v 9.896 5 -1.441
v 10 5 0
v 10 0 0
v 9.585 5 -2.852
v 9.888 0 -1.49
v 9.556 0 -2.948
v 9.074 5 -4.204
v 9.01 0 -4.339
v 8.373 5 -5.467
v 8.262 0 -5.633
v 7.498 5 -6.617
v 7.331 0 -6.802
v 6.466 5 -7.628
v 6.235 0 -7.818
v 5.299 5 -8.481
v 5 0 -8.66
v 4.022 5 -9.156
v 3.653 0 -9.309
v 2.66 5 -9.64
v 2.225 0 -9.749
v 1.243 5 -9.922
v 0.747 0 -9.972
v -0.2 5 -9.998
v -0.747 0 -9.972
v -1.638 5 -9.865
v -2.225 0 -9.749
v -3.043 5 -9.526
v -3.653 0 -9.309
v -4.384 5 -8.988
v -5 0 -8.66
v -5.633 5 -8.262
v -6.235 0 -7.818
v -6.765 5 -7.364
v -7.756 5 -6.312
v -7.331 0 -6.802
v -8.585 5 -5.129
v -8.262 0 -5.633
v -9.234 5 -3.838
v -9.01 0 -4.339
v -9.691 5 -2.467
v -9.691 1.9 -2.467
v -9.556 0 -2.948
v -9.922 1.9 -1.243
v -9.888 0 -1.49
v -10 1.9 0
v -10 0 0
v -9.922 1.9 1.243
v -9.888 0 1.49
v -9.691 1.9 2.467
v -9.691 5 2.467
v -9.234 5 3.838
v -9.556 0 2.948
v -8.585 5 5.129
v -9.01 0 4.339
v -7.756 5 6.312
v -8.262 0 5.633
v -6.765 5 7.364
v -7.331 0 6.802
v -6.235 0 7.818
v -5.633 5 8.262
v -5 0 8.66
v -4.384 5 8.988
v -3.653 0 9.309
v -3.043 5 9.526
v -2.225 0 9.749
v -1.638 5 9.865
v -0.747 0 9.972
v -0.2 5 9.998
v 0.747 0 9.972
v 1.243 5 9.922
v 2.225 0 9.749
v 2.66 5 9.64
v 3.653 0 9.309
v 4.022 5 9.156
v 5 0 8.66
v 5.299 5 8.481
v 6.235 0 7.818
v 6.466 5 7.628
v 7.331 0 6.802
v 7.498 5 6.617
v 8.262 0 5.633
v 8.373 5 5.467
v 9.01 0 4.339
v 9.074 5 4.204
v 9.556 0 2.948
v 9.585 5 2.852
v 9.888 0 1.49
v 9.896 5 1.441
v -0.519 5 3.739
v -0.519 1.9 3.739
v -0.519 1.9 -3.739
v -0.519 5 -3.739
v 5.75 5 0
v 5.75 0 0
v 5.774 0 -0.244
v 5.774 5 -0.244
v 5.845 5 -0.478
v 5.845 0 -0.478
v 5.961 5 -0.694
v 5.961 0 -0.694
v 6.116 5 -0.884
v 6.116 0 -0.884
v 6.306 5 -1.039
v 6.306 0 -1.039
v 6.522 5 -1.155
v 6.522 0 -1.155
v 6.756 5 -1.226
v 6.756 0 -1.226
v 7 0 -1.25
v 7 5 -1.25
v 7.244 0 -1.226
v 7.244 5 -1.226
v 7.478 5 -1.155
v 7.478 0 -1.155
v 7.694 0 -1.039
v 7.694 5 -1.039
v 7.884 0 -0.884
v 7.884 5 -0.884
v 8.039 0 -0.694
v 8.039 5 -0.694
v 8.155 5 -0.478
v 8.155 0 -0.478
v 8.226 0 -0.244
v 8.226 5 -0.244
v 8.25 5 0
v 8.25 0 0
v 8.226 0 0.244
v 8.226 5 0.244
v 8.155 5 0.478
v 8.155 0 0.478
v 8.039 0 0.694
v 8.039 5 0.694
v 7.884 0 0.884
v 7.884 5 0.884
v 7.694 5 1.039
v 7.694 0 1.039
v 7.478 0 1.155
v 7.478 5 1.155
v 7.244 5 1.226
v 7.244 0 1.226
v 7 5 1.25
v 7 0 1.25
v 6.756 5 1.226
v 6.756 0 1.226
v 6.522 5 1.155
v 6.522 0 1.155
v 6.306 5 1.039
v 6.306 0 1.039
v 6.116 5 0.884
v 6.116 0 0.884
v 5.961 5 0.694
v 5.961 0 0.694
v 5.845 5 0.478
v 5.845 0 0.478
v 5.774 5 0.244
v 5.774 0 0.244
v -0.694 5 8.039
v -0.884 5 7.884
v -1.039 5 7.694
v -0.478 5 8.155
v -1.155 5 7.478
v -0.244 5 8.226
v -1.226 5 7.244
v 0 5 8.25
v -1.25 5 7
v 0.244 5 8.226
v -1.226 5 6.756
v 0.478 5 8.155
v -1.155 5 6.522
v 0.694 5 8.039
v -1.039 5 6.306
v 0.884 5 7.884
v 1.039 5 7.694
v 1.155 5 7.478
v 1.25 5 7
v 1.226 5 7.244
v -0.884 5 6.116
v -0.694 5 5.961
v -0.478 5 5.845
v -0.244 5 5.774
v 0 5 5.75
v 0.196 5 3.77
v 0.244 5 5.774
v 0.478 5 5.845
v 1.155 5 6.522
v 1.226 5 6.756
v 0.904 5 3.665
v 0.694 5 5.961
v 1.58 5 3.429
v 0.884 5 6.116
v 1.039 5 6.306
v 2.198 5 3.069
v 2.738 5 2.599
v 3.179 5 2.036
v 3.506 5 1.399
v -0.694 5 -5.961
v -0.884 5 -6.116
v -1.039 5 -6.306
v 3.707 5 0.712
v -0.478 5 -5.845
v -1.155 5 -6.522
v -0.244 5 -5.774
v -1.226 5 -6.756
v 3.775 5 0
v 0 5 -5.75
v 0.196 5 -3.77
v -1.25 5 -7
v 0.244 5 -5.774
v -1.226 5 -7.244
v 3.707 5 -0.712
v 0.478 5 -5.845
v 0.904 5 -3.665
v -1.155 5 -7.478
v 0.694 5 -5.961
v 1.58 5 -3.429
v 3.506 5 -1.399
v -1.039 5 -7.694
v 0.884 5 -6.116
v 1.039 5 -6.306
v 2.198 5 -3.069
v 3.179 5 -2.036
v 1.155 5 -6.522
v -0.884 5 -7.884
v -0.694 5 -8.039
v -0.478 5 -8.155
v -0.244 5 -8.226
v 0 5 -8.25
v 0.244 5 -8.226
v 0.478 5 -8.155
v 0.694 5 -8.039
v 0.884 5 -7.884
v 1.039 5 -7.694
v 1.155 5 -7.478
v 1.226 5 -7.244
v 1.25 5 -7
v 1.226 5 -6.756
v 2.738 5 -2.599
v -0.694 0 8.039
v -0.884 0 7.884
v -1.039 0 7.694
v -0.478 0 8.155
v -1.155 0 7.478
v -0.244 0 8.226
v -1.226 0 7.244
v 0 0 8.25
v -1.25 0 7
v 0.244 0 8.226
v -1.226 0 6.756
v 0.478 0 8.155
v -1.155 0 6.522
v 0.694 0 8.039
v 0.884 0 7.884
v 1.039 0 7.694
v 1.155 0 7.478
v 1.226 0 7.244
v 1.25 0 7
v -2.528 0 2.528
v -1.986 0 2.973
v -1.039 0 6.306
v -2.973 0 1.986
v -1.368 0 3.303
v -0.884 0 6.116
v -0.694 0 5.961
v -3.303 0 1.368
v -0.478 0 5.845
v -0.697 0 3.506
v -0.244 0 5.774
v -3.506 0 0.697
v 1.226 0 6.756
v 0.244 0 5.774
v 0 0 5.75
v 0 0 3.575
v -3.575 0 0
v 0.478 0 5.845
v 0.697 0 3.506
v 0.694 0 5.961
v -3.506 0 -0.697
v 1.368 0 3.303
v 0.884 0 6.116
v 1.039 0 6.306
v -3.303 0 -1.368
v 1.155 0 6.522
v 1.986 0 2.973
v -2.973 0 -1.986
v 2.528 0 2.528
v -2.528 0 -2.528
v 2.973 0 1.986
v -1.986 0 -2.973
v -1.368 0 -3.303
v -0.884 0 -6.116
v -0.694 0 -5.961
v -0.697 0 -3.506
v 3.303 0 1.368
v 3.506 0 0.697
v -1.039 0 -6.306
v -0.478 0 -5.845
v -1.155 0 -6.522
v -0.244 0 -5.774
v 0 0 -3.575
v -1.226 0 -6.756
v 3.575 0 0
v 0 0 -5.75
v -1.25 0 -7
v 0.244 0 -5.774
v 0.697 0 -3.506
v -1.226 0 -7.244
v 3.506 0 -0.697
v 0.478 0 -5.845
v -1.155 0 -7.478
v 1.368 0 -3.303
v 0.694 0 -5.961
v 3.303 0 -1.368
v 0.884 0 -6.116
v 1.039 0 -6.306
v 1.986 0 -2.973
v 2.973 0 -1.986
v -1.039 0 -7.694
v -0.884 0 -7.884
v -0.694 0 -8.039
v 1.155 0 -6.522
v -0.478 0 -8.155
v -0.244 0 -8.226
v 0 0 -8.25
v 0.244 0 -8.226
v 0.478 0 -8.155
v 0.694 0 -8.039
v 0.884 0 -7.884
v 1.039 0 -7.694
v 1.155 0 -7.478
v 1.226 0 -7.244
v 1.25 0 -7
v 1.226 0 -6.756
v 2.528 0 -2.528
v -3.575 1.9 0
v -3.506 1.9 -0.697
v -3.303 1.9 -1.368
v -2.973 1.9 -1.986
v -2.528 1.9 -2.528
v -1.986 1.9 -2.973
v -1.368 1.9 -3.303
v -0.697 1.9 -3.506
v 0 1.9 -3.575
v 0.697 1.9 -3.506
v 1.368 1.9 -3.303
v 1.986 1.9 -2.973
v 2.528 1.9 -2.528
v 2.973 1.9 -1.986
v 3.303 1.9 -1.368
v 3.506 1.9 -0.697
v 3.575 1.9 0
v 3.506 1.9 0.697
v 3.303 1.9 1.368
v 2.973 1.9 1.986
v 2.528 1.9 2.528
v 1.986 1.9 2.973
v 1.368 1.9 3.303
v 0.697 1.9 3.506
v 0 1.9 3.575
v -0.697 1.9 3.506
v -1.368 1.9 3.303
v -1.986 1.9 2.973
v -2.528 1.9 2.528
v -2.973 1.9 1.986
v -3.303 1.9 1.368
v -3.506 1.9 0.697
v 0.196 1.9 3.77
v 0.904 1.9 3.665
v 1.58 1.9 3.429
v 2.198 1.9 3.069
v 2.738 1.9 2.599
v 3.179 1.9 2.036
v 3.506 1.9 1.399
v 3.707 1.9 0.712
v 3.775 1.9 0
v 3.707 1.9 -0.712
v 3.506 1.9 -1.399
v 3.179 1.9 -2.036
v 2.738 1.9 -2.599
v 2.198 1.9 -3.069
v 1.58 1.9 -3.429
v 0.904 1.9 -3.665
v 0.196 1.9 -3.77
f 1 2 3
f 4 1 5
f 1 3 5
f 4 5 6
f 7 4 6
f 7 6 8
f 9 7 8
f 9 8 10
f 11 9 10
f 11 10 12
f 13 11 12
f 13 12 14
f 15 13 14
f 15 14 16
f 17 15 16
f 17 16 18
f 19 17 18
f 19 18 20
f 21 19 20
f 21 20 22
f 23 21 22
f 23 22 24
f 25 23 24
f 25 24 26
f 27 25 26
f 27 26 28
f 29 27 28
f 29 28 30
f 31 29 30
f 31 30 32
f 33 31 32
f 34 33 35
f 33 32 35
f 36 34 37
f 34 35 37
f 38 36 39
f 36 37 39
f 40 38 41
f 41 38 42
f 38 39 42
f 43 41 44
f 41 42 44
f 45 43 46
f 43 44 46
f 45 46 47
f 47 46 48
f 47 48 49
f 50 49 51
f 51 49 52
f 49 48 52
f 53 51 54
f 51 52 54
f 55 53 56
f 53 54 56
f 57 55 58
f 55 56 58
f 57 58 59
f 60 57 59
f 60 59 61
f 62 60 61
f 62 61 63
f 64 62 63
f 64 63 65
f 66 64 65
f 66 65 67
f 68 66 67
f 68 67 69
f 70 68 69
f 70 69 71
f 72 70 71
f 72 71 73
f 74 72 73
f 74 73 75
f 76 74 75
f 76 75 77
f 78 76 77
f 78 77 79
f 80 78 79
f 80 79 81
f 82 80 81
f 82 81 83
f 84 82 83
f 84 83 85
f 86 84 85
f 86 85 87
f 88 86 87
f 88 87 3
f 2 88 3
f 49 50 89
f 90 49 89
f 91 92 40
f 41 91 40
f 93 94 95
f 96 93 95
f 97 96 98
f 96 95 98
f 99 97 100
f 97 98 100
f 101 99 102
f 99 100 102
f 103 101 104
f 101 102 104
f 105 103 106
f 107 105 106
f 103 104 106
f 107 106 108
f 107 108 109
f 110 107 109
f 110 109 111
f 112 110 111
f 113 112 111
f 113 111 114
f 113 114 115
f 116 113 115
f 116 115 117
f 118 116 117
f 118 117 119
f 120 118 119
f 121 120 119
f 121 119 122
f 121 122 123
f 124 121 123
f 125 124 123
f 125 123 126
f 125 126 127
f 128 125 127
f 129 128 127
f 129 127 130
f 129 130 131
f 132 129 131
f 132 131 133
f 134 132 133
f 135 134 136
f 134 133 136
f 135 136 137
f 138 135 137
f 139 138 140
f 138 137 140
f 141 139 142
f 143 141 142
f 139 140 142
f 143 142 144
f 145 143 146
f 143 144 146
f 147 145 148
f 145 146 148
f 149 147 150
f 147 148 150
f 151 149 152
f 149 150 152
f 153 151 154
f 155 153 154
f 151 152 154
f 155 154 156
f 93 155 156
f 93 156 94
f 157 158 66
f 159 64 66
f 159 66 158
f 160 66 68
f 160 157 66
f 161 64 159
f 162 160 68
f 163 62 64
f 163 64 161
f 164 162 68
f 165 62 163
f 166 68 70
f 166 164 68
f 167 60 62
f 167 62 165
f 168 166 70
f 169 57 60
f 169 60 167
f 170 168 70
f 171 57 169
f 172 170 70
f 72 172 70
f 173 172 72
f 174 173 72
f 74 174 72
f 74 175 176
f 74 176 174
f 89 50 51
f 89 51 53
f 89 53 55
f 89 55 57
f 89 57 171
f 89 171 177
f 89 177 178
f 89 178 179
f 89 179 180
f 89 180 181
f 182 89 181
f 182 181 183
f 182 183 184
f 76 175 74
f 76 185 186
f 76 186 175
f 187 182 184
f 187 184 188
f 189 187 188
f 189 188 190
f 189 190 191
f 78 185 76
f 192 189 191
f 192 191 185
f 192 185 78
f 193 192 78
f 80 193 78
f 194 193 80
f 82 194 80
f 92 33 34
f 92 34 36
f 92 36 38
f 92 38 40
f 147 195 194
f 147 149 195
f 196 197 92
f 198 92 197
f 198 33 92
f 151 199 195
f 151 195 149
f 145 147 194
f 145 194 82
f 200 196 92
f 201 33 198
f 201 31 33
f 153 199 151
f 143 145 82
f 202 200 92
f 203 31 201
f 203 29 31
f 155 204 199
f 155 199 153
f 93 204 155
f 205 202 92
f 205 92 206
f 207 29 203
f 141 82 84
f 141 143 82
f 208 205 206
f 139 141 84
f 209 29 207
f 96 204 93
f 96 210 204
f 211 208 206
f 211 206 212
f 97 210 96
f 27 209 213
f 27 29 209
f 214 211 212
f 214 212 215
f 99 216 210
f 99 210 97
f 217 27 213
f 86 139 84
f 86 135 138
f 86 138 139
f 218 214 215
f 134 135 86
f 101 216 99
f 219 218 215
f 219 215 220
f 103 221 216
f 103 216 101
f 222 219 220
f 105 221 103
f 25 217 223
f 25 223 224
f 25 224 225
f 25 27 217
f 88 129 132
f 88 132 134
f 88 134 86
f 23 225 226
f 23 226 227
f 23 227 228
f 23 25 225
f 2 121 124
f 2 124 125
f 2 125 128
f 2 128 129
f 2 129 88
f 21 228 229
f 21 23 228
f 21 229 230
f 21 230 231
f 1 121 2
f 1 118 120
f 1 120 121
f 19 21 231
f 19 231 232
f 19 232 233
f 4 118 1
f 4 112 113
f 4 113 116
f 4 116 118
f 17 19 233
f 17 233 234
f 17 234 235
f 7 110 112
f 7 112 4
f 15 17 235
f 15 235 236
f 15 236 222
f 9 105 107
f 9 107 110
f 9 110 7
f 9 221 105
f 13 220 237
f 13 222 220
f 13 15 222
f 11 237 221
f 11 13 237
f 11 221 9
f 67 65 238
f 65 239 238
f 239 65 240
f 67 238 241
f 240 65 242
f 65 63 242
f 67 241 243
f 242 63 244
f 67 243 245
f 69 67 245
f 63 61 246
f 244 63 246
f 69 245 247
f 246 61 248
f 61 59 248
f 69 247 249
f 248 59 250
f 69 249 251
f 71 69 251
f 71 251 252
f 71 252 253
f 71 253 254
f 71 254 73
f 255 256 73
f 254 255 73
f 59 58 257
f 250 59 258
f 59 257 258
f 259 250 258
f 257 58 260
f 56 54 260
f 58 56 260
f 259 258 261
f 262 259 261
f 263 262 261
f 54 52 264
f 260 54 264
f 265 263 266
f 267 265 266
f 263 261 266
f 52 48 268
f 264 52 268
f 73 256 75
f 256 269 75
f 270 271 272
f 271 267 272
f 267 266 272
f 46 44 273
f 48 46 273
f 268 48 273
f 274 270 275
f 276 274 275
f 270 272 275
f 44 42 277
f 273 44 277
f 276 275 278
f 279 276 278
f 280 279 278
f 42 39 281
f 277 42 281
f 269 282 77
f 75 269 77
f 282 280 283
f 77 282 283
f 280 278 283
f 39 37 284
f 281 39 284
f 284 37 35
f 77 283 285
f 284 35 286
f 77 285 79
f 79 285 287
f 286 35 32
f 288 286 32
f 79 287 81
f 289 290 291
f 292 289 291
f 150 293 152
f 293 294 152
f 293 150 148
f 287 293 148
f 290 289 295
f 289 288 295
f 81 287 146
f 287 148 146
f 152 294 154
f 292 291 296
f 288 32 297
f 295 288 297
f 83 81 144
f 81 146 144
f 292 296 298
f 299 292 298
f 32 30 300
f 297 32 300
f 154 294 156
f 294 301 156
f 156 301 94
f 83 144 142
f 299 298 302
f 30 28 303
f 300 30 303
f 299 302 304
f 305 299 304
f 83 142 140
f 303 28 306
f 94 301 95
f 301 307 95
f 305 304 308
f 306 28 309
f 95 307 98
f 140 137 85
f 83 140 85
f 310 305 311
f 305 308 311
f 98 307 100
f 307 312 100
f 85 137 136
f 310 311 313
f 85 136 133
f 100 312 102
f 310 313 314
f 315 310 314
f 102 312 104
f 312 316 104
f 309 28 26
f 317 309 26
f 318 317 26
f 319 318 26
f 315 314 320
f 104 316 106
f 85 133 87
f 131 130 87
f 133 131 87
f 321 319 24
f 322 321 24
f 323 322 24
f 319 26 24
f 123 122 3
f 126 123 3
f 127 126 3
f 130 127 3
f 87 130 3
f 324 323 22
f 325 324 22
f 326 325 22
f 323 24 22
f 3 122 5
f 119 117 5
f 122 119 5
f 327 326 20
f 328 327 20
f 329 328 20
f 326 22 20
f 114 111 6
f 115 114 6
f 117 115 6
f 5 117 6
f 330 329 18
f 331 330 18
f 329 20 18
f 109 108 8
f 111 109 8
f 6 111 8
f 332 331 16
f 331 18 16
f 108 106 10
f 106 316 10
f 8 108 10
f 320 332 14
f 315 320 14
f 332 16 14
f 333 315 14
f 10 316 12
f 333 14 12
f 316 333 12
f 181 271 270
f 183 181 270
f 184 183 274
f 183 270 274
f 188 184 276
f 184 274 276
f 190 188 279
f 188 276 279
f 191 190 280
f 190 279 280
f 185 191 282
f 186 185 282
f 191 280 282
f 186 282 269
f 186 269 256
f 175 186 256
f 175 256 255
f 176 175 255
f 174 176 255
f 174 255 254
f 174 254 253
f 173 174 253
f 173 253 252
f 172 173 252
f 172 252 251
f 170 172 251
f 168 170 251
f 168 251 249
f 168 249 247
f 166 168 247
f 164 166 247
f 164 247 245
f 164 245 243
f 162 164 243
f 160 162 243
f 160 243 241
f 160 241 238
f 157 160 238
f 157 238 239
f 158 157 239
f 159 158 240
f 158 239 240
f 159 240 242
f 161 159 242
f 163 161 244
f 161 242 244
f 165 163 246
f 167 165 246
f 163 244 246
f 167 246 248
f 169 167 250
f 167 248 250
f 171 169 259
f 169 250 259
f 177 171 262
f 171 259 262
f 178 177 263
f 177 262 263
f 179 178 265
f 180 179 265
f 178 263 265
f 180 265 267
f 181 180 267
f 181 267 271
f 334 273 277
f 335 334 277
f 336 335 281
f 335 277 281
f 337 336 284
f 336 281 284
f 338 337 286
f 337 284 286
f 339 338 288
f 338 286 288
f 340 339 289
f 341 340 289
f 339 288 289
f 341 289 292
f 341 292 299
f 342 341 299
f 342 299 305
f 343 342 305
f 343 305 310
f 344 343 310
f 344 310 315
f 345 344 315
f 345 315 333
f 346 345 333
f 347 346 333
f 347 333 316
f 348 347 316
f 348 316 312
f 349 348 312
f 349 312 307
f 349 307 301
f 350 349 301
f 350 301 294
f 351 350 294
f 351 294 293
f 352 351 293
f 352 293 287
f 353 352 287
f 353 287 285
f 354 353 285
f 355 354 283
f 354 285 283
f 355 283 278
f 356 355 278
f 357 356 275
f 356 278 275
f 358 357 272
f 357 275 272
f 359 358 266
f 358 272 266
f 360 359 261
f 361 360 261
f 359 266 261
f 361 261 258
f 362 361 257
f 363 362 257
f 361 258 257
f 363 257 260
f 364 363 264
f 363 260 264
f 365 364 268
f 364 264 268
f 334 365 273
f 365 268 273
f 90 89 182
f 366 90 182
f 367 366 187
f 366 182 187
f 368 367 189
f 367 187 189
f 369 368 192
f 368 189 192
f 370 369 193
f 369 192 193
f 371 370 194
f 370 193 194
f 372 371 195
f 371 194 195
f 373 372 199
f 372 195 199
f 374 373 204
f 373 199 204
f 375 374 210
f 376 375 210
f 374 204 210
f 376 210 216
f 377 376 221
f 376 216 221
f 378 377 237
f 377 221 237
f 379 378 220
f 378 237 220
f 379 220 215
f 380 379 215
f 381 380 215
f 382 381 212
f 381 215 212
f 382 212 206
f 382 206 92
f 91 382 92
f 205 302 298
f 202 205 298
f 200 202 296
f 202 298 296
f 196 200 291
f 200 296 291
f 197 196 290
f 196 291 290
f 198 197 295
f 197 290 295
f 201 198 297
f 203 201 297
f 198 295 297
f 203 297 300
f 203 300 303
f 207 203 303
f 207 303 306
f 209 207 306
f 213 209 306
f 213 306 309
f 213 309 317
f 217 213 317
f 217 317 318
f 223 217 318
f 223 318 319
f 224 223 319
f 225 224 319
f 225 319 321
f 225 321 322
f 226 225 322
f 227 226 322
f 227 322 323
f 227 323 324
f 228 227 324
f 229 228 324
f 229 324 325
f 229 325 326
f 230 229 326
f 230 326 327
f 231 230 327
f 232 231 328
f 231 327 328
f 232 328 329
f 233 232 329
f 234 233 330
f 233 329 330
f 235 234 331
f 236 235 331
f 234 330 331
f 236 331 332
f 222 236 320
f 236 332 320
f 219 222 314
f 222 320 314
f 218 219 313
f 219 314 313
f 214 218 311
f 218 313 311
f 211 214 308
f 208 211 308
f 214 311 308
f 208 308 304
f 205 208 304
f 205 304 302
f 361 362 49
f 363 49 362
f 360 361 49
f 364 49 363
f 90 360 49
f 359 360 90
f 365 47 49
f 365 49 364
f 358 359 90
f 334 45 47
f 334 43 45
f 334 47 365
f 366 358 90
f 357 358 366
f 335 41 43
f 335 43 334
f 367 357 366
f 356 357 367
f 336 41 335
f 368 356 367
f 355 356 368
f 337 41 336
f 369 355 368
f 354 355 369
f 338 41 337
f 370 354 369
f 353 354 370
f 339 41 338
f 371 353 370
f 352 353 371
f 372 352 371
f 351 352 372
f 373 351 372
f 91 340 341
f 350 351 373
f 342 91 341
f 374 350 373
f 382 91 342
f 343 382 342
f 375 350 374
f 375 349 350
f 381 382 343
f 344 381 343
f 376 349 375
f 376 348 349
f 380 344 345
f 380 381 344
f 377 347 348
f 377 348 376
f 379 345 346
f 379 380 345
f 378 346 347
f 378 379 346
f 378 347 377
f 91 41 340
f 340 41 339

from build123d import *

# Parameters (mm, degrees)
SKETCH1_R                       = 10
BOSS_EXTRUDE1_DEPTH             = 5
TAP_DRILL_FOR_M3X0_5_TAP1_D     = 2.5
TAP_DRILL_FOR_M3X0_5_TAP1_DEPTH = 38.1
CIRPATTERN1_COUNT               = 4
F_14_0_182_DIAMETER_HOLE1_D     = 7.1499984
CUT_EXTRUDE2_DEPTH              = 3.1


with BuildPart() as part:
    # Sketch1 → Boss-Extrude1 (new body)
    with BuildSketch(Plane(origin=(0, 0, 0), x_dir=(1, 0, 0), z_dir=(0, 1, 0))):
        Circle(SKETCH1_R)
    extrude(amount=BOSS_EXTRUDE1_DEPTH)

    # Tap Drill for M3x0.5 Tap1
    with Locations(Plane(origin=(0, 5, 0), x_dir=(1, 0, 0), z_dir=(0, 1, 0))):
        with Locations((7, 0)):
            tap_drill_for_m3x0_5_tap1 = Hole(TAP_DRILL_FOR_M3X0_5_TAP1_D / 2, depth=TAP_DRILL_FOR_M3X0_5_TAP1_DEPTH)

    # CirPattern1: Tap Drill for M3x0.5 Tap1 ×4 about axis, 1 skipped
    cirpattern1_axis = Axis((0, 5, 0), (0, -1, 0))
    add([tap_drill_for_m3x0_5_tap1.rotate(cirpattern1_axis, i * 360 / CIRPATTERN1_COUNT) for i in range(1, CIRPATTERN1_COUNT) if i not in (2,)], mode=Mode.SUBTRACT)

    # #14 (0.182) Diameter Hole1 (through all)
    with Locations(Plane(origin=(0, 5, 0), x_dir=(1, 0, 0), z_dir=(0, 1, 0))):
        with Locations((0, 0)):
            Hole(F_14_0_182_DIAMETER_HOLE1_D / 2)

    # Sketch9 → Cut-Extrude2 (cut)
    with BuildSketch(Plane(origin=(0, 5, 0), x_dir=(1, 0, 0), z_dir=(0, 1, 0))):
        with BuildLine():
            Line((-0.518585505, 3.739209547), (-12.660050371, 2.055327537))
            ThreePointArc((-12.660050371, 2.055327537), (-14.45, 0), (-12.660050371, -2.055327537))
            Line((-12.660050371, -2.055327537), (-0.518585505, -3.739209547))
            ThreePointArc((-0.518585505, -3.739209547), (3.7749992, 0), (-0.518585505, 3.739209547))
        make_face()
    extrude(amount=-CUT_EXTRUDE2_DEPTH, mode=Mode.SUBTRACT)


solid = part.part
